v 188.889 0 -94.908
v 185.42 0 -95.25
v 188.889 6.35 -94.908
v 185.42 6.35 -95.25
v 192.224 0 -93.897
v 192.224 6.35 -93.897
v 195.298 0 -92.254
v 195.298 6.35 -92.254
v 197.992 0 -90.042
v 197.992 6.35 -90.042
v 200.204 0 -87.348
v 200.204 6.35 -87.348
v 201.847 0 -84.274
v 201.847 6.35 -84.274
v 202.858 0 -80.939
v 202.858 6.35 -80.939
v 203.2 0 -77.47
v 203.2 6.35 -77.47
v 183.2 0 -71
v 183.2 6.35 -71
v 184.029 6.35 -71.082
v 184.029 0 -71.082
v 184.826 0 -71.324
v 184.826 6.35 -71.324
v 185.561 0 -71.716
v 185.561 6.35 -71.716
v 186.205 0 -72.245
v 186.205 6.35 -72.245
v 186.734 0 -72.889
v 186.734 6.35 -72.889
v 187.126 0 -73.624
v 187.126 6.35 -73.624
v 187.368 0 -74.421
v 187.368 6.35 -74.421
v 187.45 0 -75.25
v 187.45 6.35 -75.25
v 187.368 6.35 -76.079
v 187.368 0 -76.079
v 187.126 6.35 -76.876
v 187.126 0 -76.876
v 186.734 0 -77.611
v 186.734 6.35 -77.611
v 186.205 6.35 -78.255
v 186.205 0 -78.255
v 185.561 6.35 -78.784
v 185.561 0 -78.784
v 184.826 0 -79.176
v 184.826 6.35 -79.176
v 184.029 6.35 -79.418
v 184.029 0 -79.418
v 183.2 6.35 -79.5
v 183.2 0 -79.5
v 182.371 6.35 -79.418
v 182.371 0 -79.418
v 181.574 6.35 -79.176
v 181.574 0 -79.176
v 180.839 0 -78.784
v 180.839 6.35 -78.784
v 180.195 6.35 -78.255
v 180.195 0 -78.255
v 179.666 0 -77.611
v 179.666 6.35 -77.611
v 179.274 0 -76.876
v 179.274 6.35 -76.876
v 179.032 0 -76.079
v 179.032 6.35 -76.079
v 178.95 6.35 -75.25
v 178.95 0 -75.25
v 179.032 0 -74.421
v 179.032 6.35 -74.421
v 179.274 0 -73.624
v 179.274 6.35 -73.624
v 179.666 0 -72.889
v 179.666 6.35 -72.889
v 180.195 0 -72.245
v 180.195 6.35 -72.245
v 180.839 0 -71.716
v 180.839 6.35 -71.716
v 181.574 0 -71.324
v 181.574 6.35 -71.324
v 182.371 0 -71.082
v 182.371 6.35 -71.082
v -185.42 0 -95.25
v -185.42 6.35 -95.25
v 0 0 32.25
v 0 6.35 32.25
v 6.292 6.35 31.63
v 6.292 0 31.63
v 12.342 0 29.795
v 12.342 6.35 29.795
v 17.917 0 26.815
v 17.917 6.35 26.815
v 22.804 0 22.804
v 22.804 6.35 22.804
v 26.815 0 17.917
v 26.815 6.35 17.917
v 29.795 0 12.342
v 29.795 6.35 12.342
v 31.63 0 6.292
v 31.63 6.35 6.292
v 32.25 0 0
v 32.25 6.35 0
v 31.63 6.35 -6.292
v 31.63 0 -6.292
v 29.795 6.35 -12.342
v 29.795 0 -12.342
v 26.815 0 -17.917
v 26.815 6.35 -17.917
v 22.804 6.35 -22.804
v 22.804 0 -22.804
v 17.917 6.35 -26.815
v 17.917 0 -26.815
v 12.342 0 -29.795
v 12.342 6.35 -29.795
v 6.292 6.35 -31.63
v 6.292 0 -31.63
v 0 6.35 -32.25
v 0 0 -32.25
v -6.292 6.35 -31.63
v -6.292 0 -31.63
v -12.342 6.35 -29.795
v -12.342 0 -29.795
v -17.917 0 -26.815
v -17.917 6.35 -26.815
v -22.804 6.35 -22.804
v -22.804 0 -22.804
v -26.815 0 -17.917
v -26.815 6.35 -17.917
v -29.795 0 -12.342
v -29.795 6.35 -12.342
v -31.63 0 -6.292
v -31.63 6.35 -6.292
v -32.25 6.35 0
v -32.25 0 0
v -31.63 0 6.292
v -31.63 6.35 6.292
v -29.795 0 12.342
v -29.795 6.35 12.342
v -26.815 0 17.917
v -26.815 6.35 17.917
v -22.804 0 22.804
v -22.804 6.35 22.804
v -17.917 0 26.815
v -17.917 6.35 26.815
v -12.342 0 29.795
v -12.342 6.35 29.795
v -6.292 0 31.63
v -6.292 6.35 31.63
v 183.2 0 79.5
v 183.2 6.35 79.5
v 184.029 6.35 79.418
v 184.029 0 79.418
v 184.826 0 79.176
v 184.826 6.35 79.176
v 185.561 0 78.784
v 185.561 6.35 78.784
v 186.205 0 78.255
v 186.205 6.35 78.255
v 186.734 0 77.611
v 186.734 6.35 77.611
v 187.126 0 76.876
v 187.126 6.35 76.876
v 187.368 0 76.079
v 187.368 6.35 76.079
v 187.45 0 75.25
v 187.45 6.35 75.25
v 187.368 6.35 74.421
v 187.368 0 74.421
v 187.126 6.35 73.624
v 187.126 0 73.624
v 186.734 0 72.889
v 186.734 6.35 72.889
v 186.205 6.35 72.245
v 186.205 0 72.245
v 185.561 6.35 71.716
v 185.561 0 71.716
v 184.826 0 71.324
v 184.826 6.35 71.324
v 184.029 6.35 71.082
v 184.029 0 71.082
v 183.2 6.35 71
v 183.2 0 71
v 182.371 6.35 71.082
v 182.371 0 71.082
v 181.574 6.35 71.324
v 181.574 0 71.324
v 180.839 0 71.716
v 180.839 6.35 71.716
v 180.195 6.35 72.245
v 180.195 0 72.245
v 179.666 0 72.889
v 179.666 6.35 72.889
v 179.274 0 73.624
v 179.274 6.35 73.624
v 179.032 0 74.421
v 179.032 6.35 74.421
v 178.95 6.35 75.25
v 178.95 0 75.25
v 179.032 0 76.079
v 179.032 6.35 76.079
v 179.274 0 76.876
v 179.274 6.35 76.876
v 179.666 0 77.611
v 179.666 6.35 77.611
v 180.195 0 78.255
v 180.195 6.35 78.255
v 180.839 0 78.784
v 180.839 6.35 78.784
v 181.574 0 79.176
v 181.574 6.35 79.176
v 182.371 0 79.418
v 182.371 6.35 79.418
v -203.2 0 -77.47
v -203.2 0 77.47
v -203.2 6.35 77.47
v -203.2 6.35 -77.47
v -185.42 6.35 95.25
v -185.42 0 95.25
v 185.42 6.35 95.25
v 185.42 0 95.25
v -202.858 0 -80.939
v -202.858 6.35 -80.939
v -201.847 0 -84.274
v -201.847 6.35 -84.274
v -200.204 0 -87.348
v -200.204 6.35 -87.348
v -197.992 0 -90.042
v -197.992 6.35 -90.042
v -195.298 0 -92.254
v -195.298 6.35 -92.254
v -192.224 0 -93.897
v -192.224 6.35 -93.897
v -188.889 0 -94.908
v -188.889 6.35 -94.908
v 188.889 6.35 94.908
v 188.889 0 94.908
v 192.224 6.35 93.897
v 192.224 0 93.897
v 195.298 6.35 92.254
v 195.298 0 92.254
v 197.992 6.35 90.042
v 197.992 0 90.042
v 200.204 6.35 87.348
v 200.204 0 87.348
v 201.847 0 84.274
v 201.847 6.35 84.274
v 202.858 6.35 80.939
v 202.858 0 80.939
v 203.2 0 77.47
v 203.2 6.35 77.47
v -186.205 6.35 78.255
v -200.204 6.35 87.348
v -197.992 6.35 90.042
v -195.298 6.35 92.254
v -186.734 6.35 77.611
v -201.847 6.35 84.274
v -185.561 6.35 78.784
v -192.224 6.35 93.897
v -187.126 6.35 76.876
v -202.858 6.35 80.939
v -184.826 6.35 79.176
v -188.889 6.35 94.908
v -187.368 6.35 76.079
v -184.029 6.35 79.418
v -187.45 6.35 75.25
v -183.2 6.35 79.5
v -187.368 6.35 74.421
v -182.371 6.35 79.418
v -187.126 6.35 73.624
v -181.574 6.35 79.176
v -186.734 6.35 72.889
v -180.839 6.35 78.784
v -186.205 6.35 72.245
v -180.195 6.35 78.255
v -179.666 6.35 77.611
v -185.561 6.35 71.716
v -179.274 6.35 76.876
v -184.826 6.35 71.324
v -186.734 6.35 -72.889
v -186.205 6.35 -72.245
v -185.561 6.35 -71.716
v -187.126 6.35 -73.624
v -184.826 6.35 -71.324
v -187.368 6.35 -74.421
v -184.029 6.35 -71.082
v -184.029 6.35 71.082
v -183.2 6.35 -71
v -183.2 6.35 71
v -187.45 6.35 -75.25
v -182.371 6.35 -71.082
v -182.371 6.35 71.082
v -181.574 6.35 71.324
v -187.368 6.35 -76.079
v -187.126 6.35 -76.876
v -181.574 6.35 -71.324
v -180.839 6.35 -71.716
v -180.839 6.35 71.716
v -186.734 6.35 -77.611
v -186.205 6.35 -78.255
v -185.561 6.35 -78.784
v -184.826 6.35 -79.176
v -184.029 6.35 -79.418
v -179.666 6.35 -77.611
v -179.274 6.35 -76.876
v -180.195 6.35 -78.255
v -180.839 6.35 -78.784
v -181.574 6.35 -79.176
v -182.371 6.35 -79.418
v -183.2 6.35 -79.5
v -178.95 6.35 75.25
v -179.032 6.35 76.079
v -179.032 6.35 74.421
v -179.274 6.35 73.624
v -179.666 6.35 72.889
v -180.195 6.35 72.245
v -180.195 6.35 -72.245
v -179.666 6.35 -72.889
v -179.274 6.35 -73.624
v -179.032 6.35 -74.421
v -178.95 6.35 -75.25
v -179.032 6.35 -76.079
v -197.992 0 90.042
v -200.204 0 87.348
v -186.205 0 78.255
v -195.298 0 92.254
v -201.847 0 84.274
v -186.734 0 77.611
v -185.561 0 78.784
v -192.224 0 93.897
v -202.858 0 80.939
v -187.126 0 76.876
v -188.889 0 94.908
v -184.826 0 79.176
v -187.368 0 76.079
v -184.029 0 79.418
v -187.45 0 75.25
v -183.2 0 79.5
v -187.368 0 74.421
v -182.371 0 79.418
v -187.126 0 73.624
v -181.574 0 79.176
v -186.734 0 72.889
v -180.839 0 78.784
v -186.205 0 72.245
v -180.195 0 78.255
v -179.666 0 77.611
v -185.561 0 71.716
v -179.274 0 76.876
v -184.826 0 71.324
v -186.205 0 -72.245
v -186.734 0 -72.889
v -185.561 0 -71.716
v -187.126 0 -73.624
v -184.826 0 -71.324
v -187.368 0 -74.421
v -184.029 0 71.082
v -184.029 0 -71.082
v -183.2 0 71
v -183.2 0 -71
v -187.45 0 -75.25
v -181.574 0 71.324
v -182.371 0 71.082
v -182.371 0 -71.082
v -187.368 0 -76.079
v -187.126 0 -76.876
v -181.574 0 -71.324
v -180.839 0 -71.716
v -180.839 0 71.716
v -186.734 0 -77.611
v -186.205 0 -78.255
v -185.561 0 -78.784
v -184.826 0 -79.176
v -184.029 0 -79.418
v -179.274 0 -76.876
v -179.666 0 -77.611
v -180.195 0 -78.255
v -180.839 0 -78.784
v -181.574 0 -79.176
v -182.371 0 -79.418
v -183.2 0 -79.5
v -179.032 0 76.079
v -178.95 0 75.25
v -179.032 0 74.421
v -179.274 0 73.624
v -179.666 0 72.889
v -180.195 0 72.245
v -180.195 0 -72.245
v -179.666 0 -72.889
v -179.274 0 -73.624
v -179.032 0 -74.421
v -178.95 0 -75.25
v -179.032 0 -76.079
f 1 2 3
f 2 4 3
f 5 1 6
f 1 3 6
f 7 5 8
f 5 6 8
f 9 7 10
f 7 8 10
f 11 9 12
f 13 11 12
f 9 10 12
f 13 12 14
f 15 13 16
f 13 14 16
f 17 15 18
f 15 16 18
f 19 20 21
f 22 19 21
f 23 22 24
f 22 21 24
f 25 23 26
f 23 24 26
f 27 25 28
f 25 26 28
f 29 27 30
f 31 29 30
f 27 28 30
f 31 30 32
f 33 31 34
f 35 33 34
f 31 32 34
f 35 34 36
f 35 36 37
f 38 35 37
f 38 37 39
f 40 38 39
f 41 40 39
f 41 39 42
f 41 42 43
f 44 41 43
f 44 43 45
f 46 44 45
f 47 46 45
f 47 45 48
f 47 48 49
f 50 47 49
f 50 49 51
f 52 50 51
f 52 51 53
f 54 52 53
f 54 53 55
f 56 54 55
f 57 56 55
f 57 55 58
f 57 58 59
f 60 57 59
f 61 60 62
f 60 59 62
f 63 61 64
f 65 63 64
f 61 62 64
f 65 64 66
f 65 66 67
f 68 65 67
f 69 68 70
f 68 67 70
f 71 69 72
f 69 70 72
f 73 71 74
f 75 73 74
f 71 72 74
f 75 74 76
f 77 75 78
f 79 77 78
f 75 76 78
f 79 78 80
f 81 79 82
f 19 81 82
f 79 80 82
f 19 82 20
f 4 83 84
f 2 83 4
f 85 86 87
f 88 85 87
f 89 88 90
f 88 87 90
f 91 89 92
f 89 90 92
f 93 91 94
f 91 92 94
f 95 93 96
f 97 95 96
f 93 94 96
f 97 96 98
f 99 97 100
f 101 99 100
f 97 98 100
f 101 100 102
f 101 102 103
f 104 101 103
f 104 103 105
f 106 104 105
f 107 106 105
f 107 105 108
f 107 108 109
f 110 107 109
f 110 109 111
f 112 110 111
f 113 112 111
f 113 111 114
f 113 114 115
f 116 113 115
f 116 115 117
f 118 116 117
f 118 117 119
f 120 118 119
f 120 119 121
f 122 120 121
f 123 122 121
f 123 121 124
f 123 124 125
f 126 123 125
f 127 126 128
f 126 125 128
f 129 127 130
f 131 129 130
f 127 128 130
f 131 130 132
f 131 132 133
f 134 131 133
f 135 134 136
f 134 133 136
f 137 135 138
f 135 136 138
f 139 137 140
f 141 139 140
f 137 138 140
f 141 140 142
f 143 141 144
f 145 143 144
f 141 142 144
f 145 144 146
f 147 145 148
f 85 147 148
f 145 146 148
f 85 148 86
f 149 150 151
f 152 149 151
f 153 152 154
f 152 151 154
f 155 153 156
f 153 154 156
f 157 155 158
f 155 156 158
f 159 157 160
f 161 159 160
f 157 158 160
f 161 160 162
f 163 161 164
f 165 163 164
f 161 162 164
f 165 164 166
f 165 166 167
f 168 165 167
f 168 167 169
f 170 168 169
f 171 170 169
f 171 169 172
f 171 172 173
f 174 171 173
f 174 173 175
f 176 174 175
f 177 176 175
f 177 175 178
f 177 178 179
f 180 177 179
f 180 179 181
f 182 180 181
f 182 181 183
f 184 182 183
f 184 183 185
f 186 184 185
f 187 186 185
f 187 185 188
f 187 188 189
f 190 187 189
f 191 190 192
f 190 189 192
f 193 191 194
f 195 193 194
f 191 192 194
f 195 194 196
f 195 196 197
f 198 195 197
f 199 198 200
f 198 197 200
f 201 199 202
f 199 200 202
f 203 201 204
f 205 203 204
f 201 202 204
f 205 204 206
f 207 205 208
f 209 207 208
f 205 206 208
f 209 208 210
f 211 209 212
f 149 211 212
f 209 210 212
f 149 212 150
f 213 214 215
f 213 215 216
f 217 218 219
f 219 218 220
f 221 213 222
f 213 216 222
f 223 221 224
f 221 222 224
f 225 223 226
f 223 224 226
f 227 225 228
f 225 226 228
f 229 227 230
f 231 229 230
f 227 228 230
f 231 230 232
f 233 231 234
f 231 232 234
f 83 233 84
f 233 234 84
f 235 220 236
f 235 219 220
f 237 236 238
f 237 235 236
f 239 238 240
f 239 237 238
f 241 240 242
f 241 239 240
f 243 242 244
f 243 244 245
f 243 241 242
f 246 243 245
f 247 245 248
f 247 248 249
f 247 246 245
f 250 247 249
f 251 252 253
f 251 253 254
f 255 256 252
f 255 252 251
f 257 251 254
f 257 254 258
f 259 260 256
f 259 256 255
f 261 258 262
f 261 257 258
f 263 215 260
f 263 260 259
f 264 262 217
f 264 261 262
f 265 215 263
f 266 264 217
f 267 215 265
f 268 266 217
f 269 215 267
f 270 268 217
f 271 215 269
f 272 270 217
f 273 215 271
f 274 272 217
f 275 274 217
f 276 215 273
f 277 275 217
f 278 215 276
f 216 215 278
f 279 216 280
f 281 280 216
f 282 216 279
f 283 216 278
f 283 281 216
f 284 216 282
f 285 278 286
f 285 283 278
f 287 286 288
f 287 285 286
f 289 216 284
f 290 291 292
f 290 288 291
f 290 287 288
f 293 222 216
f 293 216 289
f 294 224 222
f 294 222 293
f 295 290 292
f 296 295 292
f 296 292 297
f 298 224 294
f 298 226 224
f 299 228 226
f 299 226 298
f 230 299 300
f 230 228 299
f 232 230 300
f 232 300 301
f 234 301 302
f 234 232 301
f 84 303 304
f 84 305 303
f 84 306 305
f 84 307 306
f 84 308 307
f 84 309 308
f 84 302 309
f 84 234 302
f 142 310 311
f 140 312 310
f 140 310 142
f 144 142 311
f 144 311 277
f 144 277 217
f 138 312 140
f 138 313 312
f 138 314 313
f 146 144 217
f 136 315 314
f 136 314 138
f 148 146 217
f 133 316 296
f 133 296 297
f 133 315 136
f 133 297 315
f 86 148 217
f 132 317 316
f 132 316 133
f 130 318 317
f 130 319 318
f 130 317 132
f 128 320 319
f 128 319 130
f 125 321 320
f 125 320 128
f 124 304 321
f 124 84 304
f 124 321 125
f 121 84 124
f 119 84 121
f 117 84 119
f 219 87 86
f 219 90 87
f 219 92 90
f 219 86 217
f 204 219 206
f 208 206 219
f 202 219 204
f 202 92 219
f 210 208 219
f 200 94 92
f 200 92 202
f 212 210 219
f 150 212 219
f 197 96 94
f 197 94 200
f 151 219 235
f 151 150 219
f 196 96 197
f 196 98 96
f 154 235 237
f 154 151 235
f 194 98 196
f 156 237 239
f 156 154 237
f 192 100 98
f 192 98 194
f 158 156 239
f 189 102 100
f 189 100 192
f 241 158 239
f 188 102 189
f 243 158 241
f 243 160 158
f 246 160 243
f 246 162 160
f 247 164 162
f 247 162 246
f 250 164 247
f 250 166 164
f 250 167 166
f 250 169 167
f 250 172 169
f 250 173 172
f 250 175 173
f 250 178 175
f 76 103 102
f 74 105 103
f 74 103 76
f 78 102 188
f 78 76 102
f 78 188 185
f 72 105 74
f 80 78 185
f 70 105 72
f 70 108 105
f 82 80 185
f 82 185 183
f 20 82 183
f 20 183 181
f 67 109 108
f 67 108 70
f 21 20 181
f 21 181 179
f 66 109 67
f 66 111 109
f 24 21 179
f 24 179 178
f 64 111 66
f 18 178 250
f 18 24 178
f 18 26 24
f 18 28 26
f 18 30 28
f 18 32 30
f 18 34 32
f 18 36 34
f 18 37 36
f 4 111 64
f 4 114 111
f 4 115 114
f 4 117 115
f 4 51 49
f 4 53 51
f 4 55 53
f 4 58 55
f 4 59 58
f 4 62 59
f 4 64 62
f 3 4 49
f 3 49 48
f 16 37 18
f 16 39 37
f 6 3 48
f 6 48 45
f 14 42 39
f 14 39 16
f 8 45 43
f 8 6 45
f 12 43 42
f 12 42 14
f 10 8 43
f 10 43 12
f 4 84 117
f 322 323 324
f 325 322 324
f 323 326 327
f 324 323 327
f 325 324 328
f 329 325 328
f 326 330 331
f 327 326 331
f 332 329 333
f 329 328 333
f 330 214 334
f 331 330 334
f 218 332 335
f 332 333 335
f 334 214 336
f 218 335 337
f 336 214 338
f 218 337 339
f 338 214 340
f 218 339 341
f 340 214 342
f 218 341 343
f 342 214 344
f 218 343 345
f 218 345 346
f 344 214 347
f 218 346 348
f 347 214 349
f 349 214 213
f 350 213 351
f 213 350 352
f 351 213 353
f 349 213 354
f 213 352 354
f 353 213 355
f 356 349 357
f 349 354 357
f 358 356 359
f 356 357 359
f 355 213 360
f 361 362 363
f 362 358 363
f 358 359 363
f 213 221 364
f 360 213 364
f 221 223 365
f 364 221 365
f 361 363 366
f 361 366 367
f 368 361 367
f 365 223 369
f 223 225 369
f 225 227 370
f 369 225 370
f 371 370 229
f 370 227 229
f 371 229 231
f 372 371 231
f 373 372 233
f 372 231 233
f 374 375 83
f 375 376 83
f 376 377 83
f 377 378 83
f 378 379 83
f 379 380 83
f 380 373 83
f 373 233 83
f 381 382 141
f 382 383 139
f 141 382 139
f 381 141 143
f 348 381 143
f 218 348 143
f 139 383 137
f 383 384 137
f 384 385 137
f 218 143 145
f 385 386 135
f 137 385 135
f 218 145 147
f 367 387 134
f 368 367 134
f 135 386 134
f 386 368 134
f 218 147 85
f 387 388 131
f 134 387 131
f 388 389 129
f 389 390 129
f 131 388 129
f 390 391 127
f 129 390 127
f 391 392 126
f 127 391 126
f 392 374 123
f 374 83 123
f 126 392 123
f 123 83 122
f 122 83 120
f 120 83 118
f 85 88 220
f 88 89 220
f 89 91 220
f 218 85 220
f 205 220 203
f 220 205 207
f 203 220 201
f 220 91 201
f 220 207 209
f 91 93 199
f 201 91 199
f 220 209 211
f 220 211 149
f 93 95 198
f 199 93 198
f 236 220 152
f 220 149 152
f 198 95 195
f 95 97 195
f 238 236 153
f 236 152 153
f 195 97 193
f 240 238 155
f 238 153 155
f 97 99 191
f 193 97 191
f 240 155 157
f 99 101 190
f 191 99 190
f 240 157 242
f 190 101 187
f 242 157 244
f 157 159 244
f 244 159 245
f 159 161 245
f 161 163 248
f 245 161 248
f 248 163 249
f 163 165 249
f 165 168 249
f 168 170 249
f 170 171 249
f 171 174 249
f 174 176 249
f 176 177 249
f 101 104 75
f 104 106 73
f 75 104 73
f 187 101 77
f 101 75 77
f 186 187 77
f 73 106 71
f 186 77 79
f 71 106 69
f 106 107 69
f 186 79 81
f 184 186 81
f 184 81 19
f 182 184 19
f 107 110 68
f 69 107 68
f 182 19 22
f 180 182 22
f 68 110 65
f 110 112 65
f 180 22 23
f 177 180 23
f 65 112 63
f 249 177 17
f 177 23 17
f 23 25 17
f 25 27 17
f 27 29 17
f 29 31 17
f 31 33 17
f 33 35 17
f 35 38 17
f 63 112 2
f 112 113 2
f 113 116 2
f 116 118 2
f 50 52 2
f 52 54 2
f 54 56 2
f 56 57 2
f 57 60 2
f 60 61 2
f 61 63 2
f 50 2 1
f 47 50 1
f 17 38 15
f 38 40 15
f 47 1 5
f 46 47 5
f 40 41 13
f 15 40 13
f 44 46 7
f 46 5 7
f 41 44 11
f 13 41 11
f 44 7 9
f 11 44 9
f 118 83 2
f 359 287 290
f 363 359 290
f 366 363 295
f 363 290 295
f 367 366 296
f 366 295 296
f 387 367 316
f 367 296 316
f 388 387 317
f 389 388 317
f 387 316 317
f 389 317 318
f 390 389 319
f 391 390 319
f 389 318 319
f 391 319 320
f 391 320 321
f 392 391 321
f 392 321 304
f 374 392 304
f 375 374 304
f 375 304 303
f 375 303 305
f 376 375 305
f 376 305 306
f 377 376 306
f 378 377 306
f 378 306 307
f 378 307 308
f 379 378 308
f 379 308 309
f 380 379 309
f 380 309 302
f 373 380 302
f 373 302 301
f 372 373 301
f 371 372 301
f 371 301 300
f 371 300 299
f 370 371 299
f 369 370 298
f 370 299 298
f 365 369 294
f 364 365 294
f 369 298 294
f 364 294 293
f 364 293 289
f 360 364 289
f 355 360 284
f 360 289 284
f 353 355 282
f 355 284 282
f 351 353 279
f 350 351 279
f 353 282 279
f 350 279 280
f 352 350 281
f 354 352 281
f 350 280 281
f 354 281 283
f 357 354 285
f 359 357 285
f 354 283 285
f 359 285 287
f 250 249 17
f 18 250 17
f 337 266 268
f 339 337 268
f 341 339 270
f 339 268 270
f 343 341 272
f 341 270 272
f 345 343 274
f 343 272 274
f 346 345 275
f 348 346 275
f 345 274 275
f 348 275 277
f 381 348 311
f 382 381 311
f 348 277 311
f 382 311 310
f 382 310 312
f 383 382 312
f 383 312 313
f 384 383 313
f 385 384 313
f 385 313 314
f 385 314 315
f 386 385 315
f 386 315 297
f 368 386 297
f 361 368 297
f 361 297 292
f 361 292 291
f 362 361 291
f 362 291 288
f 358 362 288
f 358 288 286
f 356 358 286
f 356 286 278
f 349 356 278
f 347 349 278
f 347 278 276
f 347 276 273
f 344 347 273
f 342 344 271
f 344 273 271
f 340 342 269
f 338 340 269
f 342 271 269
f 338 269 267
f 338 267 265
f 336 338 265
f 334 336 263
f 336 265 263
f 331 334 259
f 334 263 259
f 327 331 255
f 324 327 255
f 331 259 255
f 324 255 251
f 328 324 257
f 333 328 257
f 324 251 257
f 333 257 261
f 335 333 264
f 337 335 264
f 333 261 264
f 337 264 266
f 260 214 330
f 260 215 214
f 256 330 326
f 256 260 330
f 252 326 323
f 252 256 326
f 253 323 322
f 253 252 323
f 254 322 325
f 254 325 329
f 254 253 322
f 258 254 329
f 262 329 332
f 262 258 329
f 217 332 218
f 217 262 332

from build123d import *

# Parameters (mm, degrees)
SKETCH1_W           = 406.4
SKETCH1_H           = 190.5
BOSS_EXTRUDE1_DEPTH = 6.35
SKETCH2_R           = 32.25
CUT_EXTRUDE1_DEPTH  = 225.506403027
SKETCH3_R           = 4.25
CUT_EXTRUDE2_DEPTH  = 225.506403027
FILLET1_R           = 17.78


with BuildPart() as part:
    # Sketch1 → Boss-Extrude1 (new body)
    with BuildSketch(Plane(origin=(0, 0, 0), x_dir=(1, 0, 0), z_dir=(0, 1, 0))):
        Rectangle(SKETCH1_W, SKETCH1_H)
    extrude(amount=BOSS_EXTRUDE1_DEPTH)

    # Sketch2 → Cut-Extrude1 (cut, through all)
    with BuildSketch(Plane(origin=(0, 6.35, 0), x_dir=(1, 0, 0), z_dir=(0, 1, 0))):
        with Locations(Location((0, 0, 0), (0, 0, 270))):
            Circle(SKETCH2_R)
    extrude(amount=-CUT_EXTRUDE1_DEPTH, mode=Mode.SUBTRACT)

    # Sketch3 → Cut-Extrude2 (cut, through all)
    with BuildSketch(Plane(origin=(0, 6.35, 0), x_dir=(1, 0, 0), z_dir=(0, 1, 0))):
        with Locations(Location((-183.2, 75.25, 0), (0, 0, 270))):
            Circle(SKETCH3_R)
        with Locations(Location((183.2, 75.25, 0), (0, 0, 270))):
            Circle(SKETCH3_R)
        with Locations(Location((183.2, -75.25, 0), (0, 0, 270))):
            Circle(SKETCH3_R)
        with Locations(Location((-183.2, -75.25, 0), (0, 0, 270))):
            Circle(SKETCH3_R)
    extrude(amount=-CUT_EXTRUDE2_DEPTH, mode=Mode.SUBTRACT)

    # Fillet1
    fillet1_edges = [part.edges().sort_by_distance(p)[0] for p in [
        (203.2, 3.175, 95.25),
        (-203.2, 3.175, 95.25),
        (-203.2, 3.175, -95.25),
        (203.2, 3.175, -95.25),
    ]]
    fillet(fillet1_edges, radius=FILLET1_R)


solid = part.part
